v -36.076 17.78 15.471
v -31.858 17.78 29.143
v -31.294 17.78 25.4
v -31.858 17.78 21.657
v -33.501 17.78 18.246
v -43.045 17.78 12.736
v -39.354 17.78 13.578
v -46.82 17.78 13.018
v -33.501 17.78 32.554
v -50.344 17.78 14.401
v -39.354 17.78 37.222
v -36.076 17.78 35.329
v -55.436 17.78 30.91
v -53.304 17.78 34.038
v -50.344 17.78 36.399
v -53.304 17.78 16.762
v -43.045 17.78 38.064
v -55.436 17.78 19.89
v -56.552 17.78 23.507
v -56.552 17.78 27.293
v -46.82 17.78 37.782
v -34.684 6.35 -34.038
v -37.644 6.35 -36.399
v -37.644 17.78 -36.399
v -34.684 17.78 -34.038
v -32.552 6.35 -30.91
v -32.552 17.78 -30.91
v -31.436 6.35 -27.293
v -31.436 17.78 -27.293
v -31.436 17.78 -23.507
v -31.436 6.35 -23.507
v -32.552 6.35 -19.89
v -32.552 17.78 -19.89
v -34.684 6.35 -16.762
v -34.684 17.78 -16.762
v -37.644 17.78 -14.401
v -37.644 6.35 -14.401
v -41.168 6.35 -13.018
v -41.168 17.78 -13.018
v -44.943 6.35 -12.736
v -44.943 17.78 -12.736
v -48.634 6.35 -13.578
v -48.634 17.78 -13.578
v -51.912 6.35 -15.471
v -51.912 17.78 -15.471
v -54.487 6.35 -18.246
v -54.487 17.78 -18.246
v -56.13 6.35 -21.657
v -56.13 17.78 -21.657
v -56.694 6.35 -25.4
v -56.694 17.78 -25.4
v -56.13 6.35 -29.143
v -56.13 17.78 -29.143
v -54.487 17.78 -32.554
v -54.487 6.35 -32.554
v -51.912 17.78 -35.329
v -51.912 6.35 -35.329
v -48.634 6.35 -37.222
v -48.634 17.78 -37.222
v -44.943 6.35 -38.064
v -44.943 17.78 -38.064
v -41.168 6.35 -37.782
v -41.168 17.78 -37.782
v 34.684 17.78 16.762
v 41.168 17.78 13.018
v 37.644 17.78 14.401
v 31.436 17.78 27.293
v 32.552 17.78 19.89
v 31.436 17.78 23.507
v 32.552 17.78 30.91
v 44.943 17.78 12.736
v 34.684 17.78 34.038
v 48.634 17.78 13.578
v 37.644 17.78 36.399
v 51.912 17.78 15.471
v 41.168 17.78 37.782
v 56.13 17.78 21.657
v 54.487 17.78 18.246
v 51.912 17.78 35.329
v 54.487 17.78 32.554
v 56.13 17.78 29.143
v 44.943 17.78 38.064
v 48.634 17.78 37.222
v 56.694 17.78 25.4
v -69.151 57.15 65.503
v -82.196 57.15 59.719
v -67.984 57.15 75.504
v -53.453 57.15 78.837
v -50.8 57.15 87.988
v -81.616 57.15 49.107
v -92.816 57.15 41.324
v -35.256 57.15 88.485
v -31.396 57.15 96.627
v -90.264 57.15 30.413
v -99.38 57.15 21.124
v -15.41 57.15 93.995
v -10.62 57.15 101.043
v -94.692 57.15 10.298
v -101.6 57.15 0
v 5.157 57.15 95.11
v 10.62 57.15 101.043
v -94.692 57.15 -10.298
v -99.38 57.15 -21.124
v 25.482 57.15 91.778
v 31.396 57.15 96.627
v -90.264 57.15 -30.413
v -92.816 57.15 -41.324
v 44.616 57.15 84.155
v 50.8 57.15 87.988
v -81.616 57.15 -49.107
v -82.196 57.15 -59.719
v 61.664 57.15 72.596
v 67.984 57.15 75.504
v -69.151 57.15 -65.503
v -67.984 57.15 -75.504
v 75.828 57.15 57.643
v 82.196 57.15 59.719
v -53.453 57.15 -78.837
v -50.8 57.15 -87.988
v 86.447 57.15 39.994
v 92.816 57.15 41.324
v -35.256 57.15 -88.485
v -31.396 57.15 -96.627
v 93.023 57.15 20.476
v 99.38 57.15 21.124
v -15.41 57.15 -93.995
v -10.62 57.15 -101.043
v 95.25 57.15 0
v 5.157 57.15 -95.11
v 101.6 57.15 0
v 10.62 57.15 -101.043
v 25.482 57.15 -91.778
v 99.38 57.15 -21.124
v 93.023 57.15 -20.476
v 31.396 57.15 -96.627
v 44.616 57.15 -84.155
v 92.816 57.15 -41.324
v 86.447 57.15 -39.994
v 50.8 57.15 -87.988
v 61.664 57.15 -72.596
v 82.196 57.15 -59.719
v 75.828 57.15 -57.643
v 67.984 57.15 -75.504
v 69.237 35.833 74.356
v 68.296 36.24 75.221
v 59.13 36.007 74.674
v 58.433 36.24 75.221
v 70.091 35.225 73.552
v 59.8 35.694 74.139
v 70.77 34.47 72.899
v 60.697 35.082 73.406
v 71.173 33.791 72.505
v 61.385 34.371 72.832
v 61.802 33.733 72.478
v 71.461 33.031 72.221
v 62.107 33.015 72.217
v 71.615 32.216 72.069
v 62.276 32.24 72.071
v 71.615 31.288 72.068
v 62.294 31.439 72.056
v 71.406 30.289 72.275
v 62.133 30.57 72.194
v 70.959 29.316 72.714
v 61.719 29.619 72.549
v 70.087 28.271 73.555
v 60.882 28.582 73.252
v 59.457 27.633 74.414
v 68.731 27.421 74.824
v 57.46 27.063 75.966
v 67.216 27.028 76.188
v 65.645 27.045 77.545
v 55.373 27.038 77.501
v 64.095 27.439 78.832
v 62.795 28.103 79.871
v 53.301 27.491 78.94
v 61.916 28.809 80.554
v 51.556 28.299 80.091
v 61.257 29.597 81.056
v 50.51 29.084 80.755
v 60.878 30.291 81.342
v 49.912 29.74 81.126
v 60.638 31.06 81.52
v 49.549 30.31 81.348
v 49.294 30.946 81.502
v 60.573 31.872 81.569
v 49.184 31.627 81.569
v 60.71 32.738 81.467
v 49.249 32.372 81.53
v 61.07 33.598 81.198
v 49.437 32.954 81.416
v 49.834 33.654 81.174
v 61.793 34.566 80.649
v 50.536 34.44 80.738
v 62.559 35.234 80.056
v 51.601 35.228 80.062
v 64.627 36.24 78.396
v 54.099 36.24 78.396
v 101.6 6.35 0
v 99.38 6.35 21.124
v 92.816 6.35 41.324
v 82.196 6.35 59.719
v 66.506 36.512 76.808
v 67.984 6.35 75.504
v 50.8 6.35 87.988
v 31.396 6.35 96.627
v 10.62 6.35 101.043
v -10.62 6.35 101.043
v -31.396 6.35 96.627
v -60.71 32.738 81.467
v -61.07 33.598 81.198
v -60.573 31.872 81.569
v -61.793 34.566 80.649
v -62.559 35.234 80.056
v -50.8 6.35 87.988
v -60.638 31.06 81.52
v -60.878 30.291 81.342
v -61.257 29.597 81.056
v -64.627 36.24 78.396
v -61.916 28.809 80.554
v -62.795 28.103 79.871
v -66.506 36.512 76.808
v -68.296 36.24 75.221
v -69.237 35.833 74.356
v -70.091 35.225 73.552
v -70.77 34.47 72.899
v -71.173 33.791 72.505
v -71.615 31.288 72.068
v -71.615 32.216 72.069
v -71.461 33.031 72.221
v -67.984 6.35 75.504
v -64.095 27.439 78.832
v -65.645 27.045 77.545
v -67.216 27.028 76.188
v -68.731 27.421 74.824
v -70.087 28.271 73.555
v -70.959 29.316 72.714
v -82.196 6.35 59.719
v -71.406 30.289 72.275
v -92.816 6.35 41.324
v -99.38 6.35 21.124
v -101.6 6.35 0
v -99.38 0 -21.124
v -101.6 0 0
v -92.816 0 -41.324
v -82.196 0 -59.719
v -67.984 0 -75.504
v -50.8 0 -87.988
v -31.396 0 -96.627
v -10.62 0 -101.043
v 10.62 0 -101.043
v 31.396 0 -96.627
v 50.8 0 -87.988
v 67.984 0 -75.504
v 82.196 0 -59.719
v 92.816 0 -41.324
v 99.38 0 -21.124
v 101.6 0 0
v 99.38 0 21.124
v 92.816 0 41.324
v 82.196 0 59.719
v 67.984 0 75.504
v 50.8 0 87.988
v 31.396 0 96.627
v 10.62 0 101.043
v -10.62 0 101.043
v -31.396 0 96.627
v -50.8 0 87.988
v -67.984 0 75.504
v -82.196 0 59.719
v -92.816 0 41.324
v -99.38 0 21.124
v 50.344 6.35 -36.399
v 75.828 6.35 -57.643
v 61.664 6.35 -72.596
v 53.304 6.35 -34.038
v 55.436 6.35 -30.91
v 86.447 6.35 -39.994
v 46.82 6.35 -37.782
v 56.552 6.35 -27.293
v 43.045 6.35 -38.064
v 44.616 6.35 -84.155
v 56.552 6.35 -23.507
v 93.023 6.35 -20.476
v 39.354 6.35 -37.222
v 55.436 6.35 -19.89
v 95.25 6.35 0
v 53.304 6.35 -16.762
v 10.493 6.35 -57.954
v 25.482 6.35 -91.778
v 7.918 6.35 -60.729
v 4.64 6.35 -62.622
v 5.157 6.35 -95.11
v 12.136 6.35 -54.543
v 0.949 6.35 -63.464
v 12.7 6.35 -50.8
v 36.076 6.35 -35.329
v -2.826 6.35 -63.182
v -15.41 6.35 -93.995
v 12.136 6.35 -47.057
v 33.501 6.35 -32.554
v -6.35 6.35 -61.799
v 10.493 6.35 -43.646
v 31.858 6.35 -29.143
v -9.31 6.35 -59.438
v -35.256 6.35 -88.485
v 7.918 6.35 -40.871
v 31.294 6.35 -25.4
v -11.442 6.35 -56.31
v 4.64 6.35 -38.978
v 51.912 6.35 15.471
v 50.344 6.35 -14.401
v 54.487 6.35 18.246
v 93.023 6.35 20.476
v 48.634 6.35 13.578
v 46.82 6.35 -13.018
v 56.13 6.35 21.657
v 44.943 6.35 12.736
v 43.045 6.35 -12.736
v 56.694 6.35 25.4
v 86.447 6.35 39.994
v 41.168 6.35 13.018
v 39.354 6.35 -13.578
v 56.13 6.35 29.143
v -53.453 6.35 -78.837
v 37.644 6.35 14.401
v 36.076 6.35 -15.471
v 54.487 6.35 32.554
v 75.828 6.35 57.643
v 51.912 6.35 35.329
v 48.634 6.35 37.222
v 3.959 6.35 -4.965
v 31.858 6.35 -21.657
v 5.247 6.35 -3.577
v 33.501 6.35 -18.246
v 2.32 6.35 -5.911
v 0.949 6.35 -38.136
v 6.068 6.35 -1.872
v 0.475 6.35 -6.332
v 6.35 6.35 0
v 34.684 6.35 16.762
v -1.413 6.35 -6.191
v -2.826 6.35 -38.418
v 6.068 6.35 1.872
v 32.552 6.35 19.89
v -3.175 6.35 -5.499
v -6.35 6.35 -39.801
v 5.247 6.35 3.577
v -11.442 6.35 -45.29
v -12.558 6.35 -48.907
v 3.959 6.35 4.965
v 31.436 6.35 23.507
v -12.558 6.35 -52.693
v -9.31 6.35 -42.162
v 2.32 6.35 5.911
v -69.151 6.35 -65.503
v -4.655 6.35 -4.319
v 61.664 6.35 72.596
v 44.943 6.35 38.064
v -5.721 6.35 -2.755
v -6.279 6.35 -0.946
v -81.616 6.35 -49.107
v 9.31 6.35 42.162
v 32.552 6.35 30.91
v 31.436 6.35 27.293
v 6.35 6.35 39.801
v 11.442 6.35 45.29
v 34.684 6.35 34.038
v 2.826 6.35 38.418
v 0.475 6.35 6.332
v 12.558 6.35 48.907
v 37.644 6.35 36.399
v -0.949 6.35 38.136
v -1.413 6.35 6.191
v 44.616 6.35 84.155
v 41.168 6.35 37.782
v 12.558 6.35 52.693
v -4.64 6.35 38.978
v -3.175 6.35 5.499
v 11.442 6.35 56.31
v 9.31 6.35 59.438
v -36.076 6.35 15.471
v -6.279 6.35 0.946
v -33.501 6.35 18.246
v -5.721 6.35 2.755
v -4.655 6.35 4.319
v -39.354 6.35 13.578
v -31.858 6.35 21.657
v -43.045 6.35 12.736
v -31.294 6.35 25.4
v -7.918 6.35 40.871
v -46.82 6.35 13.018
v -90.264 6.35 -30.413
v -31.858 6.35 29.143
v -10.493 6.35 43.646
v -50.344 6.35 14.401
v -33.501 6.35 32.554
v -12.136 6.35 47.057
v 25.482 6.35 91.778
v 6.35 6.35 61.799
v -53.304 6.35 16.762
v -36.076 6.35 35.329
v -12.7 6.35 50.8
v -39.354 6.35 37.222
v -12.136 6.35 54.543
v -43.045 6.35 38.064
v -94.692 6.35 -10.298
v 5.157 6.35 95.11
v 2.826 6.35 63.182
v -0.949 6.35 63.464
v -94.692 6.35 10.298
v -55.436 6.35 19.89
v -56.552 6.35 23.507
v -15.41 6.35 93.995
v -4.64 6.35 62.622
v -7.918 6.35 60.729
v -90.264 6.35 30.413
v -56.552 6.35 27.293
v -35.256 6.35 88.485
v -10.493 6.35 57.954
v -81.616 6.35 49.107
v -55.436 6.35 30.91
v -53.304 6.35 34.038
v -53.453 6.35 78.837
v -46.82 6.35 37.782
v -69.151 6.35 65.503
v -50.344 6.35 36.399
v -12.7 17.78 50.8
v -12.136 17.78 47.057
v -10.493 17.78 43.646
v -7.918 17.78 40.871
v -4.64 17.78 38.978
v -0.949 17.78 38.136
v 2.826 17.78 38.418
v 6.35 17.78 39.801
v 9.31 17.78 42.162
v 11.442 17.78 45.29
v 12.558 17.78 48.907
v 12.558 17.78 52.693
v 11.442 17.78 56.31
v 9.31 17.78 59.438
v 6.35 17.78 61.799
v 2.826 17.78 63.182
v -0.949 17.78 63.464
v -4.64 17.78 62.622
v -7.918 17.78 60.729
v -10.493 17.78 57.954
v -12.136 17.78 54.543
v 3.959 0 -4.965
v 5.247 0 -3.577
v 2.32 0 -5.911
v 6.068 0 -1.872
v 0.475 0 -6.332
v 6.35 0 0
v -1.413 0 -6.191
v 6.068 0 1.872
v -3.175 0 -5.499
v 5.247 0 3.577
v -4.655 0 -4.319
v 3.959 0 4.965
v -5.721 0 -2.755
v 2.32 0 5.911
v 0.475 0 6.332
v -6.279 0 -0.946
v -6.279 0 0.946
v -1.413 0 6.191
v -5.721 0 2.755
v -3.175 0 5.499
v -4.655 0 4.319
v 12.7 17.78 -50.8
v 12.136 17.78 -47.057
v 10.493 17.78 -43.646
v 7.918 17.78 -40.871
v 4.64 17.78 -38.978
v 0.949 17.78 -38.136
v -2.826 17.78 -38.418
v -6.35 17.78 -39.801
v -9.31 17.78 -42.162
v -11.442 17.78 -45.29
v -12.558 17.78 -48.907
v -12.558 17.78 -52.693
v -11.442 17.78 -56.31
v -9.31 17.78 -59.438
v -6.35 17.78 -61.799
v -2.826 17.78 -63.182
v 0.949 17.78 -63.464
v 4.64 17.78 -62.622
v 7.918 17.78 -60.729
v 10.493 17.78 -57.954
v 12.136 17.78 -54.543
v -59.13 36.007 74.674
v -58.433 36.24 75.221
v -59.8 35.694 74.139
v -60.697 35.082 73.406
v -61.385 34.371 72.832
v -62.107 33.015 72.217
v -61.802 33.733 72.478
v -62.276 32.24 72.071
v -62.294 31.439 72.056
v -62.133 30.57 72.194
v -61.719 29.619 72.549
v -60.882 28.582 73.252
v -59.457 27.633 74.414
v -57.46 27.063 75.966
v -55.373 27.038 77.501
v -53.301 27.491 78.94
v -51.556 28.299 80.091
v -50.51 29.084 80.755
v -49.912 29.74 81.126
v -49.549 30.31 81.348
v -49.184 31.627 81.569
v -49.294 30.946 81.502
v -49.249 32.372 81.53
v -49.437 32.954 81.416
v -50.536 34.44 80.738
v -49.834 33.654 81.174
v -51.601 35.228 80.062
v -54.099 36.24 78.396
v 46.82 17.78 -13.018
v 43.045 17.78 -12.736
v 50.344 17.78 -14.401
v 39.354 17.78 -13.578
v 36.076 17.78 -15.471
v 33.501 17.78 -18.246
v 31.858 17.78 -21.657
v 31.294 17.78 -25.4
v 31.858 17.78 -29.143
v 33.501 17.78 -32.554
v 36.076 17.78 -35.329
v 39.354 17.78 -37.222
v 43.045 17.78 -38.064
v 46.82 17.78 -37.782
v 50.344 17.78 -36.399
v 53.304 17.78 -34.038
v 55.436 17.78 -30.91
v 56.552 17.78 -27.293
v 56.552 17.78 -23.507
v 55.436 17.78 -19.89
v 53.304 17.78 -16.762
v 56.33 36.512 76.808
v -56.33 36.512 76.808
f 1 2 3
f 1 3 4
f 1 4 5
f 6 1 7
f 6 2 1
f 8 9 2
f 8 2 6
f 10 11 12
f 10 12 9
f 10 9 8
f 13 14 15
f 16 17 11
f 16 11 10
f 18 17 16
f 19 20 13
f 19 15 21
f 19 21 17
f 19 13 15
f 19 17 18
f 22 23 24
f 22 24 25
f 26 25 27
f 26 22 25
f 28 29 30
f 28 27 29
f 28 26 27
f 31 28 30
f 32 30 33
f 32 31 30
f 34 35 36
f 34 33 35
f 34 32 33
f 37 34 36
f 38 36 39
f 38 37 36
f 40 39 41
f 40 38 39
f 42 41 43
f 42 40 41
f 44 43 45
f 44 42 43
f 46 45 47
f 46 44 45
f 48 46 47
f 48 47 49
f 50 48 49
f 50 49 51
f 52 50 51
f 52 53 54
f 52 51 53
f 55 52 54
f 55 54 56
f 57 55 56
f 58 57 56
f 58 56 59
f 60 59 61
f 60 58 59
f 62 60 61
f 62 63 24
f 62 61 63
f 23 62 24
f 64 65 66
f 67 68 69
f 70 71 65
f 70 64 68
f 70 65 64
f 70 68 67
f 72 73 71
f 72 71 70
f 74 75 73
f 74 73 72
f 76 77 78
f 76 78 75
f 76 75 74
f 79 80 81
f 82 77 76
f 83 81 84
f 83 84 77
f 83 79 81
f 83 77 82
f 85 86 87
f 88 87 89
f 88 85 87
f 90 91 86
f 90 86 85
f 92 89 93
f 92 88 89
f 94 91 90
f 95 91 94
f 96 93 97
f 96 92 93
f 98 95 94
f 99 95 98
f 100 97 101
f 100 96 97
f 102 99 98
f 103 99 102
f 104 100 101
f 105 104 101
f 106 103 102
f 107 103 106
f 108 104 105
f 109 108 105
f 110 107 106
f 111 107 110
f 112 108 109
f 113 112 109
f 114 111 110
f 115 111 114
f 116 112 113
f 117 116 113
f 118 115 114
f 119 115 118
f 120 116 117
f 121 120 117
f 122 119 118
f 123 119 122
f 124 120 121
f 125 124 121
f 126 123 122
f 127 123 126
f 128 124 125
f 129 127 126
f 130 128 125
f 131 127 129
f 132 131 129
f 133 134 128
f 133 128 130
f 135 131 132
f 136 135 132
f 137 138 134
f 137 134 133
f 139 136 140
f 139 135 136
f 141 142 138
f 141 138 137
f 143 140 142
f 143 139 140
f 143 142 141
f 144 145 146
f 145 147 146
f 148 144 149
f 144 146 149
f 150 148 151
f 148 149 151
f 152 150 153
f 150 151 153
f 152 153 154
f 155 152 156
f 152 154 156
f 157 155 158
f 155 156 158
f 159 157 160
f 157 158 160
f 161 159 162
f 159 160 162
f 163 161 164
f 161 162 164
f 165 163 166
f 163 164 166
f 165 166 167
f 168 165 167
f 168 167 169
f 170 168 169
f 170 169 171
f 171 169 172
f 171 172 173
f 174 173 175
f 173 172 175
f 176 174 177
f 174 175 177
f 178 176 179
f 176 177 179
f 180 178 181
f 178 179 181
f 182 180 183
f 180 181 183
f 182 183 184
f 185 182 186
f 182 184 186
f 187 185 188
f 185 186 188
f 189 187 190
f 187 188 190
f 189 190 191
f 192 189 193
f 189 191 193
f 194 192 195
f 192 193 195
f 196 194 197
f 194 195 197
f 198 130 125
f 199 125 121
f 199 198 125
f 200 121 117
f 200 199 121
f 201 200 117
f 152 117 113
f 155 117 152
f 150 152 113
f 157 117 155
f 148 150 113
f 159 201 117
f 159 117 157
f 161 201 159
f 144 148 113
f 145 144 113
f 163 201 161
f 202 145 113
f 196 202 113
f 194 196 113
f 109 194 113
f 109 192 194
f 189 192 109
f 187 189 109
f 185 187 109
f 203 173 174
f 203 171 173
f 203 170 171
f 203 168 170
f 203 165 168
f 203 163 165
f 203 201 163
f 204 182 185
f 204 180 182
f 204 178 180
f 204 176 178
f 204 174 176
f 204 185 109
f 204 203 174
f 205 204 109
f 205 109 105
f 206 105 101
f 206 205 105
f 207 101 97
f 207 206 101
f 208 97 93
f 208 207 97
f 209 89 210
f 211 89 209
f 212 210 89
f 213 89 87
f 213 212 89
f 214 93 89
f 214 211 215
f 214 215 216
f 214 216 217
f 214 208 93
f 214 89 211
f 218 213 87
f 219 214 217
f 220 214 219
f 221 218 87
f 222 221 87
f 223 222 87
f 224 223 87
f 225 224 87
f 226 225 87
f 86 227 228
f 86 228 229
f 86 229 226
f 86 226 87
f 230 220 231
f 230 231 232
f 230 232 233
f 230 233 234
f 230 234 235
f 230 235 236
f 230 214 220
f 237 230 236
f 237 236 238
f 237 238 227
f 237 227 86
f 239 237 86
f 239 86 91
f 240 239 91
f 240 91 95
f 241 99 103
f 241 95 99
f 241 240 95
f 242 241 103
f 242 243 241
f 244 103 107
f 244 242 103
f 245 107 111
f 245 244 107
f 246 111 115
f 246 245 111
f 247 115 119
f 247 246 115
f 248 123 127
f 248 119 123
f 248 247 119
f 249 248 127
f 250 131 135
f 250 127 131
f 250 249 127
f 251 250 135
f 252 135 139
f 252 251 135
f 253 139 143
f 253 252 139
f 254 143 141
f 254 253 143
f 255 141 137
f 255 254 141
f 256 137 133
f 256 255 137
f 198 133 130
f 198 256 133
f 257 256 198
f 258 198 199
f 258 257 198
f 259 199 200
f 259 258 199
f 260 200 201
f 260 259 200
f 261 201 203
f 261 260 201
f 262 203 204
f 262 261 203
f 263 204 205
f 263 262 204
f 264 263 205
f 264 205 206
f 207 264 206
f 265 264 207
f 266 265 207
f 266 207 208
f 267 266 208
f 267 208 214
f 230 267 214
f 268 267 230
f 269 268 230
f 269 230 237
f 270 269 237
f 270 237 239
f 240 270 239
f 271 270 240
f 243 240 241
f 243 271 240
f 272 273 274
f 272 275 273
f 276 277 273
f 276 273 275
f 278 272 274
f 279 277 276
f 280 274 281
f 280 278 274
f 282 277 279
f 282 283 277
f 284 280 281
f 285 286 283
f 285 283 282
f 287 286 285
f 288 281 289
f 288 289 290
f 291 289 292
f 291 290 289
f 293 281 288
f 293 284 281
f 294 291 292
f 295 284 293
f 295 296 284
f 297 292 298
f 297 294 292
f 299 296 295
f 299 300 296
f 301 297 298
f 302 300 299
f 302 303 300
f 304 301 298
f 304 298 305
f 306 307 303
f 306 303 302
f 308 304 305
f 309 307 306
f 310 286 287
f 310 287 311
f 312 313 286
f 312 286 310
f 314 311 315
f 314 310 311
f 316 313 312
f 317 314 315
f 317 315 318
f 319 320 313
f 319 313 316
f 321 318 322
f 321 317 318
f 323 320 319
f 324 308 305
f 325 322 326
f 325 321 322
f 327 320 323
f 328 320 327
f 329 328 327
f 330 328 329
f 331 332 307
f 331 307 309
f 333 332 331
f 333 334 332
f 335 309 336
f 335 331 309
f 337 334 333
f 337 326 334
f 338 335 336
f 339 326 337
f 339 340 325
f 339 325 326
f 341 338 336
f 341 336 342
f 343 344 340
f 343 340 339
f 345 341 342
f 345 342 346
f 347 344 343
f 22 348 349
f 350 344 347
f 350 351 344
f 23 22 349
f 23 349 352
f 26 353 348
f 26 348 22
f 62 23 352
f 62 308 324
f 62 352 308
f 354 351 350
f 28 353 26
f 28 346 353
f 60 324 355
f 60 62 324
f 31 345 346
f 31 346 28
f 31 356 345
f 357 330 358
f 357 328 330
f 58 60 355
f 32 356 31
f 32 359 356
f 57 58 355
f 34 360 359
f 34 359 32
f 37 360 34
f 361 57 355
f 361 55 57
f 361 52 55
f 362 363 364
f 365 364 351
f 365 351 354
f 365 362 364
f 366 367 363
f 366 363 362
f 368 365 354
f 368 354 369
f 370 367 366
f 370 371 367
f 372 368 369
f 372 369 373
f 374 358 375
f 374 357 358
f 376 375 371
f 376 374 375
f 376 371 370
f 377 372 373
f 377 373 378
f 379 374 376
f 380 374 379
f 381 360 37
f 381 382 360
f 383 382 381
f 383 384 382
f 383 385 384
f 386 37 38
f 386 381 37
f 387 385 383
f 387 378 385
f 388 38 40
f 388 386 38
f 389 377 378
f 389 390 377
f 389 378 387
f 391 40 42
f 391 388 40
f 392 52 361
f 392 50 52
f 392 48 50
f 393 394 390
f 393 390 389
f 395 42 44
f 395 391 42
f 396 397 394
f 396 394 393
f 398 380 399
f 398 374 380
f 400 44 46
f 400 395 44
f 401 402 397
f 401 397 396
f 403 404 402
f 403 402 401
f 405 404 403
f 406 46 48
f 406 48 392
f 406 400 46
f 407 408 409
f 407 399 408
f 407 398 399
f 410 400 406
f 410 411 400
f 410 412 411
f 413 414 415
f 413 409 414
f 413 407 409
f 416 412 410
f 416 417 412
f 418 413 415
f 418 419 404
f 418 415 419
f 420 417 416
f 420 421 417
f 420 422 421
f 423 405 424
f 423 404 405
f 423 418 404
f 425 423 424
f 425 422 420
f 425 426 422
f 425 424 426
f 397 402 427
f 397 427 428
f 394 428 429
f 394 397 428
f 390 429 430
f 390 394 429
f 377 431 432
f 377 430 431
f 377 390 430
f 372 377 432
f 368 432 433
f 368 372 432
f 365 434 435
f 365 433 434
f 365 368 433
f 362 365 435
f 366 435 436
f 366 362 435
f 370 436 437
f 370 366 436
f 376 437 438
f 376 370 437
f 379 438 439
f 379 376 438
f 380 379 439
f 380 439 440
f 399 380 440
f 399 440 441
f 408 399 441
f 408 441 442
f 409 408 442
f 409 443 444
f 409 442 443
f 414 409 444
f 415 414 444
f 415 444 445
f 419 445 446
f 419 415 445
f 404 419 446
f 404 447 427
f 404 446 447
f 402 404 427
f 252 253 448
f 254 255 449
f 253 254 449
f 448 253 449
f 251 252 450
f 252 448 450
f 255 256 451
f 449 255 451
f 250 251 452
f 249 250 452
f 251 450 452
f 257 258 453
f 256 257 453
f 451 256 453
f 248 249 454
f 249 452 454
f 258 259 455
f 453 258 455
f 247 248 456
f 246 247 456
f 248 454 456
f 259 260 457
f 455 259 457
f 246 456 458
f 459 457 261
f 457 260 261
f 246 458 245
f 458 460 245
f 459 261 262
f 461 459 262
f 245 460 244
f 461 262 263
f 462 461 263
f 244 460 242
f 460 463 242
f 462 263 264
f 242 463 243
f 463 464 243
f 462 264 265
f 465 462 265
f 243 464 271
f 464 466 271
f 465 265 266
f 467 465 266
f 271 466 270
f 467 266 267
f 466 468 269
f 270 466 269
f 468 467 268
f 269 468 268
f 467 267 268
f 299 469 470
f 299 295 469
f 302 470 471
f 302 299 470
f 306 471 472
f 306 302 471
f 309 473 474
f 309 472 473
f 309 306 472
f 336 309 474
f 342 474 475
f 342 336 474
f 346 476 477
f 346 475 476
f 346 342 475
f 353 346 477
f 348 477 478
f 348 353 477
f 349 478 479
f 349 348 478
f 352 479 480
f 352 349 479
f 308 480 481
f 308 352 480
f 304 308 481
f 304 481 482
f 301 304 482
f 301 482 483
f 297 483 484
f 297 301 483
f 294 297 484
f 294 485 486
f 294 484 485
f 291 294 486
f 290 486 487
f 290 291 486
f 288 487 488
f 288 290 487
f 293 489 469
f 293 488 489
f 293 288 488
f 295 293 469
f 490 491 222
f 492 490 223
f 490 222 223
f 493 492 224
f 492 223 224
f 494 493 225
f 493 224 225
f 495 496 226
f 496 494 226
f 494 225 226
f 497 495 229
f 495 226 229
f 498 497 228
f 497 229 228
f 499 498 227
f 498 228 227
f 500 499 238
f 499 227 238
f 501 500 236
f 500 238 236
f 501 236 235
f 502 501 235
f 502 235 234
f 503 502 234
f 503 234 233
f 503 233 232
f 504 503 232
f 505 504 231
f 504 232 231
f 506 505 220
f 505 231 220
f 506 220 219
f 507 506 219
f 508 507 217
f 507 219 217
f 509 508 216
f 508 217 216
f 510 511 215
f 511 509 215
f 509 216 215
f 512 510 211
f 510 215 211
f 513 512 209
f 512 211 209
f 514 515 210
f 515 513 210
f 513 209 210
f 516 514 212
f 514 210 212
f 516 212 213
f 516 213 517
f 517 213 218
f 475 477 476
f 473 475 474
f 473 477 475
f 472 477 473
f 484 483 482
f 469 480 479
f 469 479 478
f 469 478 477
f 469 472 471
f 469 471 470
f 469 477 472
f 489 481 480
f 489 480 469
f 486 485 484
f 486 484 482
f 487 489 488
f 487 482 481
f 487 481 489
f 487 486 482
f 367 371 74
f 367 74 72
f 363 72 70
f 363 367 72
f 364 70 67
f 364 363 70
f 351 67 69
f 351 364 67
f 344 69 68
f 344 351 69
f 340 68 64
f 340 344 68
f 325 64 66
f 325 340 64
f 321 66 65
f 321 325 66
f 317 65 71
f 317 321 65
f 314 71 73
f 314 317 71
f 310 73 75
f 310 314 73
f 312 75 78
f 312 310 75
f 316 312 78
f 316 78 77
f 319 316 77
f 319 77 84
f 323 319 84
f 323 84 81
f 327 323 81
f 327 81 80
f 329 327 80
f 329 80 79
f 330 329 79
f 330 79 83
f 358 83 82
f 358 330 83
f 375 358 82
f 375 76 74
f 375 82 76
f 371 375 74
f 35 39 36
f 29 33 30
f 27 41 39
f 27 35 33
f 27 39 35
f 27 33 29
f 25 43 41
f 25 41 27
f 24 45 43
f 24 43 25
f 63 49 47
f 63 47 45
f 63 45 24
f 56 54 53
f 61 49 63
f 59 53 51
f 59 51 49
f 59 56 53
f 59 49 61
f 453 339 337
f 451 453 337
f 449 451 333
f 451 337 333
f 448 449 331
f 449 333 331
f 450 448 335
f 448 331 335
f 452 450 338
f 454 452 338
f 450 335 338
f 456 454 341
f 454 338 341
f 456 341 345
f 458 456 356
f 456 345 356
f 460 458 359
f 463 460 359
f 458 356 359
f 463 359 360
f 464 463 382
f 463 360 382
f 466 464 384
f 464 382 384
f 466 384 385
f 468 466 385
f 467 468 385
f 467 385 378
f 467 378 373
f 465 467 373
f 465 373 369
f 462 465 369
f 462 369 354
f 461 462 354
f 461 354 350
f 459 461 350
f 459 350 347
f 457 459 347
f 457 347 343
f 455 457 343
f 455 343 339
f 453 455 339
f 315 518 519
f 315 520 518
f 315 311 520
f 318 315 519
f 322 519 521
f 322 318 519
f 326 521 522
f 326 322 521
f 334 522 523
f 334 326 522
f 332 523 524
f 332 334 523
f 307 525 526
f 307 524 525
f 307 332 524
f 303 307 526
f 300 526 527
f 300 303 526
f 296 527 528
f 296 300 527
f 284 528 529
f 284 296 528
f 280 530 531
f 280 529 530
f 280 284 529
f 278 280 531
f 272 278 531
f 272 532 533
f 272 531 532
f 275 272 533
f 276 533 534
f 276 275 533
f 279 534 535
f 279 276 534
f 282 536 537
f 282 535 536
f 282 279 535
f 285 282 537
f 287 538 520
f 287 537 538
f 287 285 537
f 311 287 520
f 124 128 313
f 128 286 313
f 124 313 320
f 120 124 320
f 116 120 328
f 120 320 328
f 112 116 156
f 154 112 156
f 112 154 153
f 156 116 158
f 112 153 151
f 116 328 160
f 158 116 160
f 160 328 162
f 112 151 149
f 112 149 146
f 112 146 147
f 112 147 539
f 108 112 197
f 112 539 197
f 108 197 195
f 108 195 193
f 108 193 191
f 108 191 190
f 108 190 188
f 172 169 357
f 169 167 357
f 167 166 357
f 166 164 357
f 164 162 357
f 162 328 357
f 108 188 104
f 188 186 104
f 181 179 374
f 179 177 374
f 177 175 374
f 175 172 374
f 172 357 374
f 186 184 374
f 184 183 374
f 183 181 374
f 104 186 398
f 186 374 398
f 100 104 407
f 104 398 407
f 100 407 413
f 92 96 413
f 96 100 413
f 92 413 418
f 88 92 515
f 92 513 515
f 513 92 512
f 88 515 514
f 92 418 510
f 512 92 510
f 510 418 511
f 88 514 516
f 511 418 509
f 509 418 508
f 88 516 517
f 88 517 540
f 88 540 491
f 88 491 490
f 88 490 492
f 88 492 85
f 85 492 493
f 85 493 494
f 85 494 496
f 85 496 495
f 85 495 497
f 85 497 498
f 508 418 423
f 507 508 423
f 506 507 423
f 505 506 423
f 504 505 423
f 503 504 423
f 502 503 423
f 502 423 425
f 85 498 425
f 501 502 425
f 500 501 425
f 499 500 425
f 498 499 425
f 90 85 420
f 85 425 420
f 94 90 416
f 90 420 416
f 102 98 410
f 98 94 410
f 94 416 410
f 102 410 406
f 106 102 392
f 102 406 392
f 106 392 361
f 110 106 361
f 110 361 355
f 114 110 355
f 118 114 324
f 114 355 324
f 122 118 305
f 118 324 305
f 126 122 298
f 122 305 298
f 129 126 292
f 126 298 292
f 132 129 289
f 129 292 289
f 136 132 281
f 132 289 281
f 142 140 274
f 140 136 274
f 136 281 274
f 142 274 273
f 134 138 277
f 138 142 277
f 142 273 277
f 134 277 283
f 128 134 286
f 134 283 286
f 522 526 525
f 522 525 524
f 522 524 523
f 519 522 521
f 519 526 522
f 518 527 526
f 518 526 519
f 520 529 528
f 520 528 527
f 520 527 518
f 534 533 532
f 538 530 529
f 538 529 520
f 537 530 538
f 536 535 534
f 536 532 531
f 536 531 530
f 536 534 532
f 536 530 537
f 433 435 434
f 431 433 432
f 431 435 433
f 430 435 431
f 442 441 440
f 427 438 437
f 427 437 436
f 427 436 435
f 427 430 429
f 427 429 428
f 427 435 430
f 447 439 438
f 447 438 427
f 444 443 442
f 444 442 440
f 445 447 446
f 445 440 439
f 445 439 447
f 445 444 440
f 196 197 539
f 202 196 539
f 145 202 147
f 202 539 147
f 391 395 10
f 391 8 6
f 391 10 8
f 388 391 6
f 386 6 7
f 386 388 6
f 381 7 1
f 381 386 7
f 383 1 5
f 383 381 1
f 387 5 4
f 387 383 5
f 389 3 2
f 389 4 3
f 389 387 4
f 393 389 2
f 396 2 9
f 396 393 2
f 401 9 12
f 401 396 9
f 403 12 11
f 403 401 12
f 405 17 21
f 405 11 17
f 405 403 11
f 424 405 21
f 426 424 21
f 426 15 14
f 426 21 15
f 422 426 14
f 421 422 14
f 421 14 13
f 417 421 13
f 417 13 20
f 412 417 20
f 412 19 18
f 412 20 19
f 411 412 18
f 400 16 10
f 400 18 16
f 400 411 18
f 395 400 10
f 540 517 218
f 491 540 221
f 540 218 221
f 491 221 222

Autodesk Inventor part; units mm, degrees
ref_plane "YZ Plane" through (0, 0, 0) normal (1, 0, 0) x (0, 1, 0)
ref_plane "XZ Plane" through (0, 0, 0) normal (0, 1, 0) x (-1, 0, 0)
ref_plane "XY Plane" through (0, 0, 0) normal (0, 0, 1) x (1, 0, 0)
sketch "Sketch1" plane through (0, 0, 0) normal (0, 1, 0) x (-1, 0, 0)
  circle A0 centre (0, 0) radius 101.6
  dimension "baseOutsideDiameter" = 203.2
extrude "Extrusion1" add sketch "Sketch1" along normal blind 6.35
sketch "Sketch2" plane through (0, 6.35, 0) normal (0, 1, 0) x (1, 0, 0)
  circle A0 centre (0, 0) radius 101.6
  circle A1 centre (0, 0) radius 95.25
  dimension "d4" = 6.35
  dimension "d5" = 203.2
extrude "Extrusion2" add sketch "Sketch2" along normal blind 50.8
sketch "Sketch3" plane through (0, 6.35, 0) normal (0, 1, 0) x (1, 0, 0)
  circle A0 centre (0, 0) radius 6.35
  dimension "wormDriveDiameer" = 12.7
extrude "Extrusion3" cut sketch "Sketch3" against normal through all
sketch "Sketch5" plane through (0, 6.35, 0) normal (0, 1, 0) x (1, 0, 0)
  circle A0 centre (0, 50.8) radius 12.7
  point P0 (0, 0)
  dimension "wormGearSupportBaseDiameter" = 25.4
  dimension "radiusOfGearSupports" = 50.8
extrude "Extrusion5" add sketch "Sketch5" along normal blind 11.43
pattern_circular "Circular Pattern1" count 6 over 360 about axis through (0, -10, 0) along (0, 1, 0) of "Extrusion5"
sketch "Sketch6" plane through (0, 0, 0) normal (1, 0, 0) x (0, 1, 0)
  arc A0 (36.2401, 78.3957) -> (36.2401, 75.2207) centre (31.75, 76.8082) ccw projected
  circle A1 centre (31.75, 76.8082) radius 4.7625
  point P0 (0, 0)
extrude "Extrusion6" cut sketch "Sketch6" along normal through all both and the other way through all
equation "\"d4\" = baseThickness"
equation "\"d5\" = baseOutsideDiameter"
equation "\"baseThickness\" = 6.35"
properties part number "baseV01"
